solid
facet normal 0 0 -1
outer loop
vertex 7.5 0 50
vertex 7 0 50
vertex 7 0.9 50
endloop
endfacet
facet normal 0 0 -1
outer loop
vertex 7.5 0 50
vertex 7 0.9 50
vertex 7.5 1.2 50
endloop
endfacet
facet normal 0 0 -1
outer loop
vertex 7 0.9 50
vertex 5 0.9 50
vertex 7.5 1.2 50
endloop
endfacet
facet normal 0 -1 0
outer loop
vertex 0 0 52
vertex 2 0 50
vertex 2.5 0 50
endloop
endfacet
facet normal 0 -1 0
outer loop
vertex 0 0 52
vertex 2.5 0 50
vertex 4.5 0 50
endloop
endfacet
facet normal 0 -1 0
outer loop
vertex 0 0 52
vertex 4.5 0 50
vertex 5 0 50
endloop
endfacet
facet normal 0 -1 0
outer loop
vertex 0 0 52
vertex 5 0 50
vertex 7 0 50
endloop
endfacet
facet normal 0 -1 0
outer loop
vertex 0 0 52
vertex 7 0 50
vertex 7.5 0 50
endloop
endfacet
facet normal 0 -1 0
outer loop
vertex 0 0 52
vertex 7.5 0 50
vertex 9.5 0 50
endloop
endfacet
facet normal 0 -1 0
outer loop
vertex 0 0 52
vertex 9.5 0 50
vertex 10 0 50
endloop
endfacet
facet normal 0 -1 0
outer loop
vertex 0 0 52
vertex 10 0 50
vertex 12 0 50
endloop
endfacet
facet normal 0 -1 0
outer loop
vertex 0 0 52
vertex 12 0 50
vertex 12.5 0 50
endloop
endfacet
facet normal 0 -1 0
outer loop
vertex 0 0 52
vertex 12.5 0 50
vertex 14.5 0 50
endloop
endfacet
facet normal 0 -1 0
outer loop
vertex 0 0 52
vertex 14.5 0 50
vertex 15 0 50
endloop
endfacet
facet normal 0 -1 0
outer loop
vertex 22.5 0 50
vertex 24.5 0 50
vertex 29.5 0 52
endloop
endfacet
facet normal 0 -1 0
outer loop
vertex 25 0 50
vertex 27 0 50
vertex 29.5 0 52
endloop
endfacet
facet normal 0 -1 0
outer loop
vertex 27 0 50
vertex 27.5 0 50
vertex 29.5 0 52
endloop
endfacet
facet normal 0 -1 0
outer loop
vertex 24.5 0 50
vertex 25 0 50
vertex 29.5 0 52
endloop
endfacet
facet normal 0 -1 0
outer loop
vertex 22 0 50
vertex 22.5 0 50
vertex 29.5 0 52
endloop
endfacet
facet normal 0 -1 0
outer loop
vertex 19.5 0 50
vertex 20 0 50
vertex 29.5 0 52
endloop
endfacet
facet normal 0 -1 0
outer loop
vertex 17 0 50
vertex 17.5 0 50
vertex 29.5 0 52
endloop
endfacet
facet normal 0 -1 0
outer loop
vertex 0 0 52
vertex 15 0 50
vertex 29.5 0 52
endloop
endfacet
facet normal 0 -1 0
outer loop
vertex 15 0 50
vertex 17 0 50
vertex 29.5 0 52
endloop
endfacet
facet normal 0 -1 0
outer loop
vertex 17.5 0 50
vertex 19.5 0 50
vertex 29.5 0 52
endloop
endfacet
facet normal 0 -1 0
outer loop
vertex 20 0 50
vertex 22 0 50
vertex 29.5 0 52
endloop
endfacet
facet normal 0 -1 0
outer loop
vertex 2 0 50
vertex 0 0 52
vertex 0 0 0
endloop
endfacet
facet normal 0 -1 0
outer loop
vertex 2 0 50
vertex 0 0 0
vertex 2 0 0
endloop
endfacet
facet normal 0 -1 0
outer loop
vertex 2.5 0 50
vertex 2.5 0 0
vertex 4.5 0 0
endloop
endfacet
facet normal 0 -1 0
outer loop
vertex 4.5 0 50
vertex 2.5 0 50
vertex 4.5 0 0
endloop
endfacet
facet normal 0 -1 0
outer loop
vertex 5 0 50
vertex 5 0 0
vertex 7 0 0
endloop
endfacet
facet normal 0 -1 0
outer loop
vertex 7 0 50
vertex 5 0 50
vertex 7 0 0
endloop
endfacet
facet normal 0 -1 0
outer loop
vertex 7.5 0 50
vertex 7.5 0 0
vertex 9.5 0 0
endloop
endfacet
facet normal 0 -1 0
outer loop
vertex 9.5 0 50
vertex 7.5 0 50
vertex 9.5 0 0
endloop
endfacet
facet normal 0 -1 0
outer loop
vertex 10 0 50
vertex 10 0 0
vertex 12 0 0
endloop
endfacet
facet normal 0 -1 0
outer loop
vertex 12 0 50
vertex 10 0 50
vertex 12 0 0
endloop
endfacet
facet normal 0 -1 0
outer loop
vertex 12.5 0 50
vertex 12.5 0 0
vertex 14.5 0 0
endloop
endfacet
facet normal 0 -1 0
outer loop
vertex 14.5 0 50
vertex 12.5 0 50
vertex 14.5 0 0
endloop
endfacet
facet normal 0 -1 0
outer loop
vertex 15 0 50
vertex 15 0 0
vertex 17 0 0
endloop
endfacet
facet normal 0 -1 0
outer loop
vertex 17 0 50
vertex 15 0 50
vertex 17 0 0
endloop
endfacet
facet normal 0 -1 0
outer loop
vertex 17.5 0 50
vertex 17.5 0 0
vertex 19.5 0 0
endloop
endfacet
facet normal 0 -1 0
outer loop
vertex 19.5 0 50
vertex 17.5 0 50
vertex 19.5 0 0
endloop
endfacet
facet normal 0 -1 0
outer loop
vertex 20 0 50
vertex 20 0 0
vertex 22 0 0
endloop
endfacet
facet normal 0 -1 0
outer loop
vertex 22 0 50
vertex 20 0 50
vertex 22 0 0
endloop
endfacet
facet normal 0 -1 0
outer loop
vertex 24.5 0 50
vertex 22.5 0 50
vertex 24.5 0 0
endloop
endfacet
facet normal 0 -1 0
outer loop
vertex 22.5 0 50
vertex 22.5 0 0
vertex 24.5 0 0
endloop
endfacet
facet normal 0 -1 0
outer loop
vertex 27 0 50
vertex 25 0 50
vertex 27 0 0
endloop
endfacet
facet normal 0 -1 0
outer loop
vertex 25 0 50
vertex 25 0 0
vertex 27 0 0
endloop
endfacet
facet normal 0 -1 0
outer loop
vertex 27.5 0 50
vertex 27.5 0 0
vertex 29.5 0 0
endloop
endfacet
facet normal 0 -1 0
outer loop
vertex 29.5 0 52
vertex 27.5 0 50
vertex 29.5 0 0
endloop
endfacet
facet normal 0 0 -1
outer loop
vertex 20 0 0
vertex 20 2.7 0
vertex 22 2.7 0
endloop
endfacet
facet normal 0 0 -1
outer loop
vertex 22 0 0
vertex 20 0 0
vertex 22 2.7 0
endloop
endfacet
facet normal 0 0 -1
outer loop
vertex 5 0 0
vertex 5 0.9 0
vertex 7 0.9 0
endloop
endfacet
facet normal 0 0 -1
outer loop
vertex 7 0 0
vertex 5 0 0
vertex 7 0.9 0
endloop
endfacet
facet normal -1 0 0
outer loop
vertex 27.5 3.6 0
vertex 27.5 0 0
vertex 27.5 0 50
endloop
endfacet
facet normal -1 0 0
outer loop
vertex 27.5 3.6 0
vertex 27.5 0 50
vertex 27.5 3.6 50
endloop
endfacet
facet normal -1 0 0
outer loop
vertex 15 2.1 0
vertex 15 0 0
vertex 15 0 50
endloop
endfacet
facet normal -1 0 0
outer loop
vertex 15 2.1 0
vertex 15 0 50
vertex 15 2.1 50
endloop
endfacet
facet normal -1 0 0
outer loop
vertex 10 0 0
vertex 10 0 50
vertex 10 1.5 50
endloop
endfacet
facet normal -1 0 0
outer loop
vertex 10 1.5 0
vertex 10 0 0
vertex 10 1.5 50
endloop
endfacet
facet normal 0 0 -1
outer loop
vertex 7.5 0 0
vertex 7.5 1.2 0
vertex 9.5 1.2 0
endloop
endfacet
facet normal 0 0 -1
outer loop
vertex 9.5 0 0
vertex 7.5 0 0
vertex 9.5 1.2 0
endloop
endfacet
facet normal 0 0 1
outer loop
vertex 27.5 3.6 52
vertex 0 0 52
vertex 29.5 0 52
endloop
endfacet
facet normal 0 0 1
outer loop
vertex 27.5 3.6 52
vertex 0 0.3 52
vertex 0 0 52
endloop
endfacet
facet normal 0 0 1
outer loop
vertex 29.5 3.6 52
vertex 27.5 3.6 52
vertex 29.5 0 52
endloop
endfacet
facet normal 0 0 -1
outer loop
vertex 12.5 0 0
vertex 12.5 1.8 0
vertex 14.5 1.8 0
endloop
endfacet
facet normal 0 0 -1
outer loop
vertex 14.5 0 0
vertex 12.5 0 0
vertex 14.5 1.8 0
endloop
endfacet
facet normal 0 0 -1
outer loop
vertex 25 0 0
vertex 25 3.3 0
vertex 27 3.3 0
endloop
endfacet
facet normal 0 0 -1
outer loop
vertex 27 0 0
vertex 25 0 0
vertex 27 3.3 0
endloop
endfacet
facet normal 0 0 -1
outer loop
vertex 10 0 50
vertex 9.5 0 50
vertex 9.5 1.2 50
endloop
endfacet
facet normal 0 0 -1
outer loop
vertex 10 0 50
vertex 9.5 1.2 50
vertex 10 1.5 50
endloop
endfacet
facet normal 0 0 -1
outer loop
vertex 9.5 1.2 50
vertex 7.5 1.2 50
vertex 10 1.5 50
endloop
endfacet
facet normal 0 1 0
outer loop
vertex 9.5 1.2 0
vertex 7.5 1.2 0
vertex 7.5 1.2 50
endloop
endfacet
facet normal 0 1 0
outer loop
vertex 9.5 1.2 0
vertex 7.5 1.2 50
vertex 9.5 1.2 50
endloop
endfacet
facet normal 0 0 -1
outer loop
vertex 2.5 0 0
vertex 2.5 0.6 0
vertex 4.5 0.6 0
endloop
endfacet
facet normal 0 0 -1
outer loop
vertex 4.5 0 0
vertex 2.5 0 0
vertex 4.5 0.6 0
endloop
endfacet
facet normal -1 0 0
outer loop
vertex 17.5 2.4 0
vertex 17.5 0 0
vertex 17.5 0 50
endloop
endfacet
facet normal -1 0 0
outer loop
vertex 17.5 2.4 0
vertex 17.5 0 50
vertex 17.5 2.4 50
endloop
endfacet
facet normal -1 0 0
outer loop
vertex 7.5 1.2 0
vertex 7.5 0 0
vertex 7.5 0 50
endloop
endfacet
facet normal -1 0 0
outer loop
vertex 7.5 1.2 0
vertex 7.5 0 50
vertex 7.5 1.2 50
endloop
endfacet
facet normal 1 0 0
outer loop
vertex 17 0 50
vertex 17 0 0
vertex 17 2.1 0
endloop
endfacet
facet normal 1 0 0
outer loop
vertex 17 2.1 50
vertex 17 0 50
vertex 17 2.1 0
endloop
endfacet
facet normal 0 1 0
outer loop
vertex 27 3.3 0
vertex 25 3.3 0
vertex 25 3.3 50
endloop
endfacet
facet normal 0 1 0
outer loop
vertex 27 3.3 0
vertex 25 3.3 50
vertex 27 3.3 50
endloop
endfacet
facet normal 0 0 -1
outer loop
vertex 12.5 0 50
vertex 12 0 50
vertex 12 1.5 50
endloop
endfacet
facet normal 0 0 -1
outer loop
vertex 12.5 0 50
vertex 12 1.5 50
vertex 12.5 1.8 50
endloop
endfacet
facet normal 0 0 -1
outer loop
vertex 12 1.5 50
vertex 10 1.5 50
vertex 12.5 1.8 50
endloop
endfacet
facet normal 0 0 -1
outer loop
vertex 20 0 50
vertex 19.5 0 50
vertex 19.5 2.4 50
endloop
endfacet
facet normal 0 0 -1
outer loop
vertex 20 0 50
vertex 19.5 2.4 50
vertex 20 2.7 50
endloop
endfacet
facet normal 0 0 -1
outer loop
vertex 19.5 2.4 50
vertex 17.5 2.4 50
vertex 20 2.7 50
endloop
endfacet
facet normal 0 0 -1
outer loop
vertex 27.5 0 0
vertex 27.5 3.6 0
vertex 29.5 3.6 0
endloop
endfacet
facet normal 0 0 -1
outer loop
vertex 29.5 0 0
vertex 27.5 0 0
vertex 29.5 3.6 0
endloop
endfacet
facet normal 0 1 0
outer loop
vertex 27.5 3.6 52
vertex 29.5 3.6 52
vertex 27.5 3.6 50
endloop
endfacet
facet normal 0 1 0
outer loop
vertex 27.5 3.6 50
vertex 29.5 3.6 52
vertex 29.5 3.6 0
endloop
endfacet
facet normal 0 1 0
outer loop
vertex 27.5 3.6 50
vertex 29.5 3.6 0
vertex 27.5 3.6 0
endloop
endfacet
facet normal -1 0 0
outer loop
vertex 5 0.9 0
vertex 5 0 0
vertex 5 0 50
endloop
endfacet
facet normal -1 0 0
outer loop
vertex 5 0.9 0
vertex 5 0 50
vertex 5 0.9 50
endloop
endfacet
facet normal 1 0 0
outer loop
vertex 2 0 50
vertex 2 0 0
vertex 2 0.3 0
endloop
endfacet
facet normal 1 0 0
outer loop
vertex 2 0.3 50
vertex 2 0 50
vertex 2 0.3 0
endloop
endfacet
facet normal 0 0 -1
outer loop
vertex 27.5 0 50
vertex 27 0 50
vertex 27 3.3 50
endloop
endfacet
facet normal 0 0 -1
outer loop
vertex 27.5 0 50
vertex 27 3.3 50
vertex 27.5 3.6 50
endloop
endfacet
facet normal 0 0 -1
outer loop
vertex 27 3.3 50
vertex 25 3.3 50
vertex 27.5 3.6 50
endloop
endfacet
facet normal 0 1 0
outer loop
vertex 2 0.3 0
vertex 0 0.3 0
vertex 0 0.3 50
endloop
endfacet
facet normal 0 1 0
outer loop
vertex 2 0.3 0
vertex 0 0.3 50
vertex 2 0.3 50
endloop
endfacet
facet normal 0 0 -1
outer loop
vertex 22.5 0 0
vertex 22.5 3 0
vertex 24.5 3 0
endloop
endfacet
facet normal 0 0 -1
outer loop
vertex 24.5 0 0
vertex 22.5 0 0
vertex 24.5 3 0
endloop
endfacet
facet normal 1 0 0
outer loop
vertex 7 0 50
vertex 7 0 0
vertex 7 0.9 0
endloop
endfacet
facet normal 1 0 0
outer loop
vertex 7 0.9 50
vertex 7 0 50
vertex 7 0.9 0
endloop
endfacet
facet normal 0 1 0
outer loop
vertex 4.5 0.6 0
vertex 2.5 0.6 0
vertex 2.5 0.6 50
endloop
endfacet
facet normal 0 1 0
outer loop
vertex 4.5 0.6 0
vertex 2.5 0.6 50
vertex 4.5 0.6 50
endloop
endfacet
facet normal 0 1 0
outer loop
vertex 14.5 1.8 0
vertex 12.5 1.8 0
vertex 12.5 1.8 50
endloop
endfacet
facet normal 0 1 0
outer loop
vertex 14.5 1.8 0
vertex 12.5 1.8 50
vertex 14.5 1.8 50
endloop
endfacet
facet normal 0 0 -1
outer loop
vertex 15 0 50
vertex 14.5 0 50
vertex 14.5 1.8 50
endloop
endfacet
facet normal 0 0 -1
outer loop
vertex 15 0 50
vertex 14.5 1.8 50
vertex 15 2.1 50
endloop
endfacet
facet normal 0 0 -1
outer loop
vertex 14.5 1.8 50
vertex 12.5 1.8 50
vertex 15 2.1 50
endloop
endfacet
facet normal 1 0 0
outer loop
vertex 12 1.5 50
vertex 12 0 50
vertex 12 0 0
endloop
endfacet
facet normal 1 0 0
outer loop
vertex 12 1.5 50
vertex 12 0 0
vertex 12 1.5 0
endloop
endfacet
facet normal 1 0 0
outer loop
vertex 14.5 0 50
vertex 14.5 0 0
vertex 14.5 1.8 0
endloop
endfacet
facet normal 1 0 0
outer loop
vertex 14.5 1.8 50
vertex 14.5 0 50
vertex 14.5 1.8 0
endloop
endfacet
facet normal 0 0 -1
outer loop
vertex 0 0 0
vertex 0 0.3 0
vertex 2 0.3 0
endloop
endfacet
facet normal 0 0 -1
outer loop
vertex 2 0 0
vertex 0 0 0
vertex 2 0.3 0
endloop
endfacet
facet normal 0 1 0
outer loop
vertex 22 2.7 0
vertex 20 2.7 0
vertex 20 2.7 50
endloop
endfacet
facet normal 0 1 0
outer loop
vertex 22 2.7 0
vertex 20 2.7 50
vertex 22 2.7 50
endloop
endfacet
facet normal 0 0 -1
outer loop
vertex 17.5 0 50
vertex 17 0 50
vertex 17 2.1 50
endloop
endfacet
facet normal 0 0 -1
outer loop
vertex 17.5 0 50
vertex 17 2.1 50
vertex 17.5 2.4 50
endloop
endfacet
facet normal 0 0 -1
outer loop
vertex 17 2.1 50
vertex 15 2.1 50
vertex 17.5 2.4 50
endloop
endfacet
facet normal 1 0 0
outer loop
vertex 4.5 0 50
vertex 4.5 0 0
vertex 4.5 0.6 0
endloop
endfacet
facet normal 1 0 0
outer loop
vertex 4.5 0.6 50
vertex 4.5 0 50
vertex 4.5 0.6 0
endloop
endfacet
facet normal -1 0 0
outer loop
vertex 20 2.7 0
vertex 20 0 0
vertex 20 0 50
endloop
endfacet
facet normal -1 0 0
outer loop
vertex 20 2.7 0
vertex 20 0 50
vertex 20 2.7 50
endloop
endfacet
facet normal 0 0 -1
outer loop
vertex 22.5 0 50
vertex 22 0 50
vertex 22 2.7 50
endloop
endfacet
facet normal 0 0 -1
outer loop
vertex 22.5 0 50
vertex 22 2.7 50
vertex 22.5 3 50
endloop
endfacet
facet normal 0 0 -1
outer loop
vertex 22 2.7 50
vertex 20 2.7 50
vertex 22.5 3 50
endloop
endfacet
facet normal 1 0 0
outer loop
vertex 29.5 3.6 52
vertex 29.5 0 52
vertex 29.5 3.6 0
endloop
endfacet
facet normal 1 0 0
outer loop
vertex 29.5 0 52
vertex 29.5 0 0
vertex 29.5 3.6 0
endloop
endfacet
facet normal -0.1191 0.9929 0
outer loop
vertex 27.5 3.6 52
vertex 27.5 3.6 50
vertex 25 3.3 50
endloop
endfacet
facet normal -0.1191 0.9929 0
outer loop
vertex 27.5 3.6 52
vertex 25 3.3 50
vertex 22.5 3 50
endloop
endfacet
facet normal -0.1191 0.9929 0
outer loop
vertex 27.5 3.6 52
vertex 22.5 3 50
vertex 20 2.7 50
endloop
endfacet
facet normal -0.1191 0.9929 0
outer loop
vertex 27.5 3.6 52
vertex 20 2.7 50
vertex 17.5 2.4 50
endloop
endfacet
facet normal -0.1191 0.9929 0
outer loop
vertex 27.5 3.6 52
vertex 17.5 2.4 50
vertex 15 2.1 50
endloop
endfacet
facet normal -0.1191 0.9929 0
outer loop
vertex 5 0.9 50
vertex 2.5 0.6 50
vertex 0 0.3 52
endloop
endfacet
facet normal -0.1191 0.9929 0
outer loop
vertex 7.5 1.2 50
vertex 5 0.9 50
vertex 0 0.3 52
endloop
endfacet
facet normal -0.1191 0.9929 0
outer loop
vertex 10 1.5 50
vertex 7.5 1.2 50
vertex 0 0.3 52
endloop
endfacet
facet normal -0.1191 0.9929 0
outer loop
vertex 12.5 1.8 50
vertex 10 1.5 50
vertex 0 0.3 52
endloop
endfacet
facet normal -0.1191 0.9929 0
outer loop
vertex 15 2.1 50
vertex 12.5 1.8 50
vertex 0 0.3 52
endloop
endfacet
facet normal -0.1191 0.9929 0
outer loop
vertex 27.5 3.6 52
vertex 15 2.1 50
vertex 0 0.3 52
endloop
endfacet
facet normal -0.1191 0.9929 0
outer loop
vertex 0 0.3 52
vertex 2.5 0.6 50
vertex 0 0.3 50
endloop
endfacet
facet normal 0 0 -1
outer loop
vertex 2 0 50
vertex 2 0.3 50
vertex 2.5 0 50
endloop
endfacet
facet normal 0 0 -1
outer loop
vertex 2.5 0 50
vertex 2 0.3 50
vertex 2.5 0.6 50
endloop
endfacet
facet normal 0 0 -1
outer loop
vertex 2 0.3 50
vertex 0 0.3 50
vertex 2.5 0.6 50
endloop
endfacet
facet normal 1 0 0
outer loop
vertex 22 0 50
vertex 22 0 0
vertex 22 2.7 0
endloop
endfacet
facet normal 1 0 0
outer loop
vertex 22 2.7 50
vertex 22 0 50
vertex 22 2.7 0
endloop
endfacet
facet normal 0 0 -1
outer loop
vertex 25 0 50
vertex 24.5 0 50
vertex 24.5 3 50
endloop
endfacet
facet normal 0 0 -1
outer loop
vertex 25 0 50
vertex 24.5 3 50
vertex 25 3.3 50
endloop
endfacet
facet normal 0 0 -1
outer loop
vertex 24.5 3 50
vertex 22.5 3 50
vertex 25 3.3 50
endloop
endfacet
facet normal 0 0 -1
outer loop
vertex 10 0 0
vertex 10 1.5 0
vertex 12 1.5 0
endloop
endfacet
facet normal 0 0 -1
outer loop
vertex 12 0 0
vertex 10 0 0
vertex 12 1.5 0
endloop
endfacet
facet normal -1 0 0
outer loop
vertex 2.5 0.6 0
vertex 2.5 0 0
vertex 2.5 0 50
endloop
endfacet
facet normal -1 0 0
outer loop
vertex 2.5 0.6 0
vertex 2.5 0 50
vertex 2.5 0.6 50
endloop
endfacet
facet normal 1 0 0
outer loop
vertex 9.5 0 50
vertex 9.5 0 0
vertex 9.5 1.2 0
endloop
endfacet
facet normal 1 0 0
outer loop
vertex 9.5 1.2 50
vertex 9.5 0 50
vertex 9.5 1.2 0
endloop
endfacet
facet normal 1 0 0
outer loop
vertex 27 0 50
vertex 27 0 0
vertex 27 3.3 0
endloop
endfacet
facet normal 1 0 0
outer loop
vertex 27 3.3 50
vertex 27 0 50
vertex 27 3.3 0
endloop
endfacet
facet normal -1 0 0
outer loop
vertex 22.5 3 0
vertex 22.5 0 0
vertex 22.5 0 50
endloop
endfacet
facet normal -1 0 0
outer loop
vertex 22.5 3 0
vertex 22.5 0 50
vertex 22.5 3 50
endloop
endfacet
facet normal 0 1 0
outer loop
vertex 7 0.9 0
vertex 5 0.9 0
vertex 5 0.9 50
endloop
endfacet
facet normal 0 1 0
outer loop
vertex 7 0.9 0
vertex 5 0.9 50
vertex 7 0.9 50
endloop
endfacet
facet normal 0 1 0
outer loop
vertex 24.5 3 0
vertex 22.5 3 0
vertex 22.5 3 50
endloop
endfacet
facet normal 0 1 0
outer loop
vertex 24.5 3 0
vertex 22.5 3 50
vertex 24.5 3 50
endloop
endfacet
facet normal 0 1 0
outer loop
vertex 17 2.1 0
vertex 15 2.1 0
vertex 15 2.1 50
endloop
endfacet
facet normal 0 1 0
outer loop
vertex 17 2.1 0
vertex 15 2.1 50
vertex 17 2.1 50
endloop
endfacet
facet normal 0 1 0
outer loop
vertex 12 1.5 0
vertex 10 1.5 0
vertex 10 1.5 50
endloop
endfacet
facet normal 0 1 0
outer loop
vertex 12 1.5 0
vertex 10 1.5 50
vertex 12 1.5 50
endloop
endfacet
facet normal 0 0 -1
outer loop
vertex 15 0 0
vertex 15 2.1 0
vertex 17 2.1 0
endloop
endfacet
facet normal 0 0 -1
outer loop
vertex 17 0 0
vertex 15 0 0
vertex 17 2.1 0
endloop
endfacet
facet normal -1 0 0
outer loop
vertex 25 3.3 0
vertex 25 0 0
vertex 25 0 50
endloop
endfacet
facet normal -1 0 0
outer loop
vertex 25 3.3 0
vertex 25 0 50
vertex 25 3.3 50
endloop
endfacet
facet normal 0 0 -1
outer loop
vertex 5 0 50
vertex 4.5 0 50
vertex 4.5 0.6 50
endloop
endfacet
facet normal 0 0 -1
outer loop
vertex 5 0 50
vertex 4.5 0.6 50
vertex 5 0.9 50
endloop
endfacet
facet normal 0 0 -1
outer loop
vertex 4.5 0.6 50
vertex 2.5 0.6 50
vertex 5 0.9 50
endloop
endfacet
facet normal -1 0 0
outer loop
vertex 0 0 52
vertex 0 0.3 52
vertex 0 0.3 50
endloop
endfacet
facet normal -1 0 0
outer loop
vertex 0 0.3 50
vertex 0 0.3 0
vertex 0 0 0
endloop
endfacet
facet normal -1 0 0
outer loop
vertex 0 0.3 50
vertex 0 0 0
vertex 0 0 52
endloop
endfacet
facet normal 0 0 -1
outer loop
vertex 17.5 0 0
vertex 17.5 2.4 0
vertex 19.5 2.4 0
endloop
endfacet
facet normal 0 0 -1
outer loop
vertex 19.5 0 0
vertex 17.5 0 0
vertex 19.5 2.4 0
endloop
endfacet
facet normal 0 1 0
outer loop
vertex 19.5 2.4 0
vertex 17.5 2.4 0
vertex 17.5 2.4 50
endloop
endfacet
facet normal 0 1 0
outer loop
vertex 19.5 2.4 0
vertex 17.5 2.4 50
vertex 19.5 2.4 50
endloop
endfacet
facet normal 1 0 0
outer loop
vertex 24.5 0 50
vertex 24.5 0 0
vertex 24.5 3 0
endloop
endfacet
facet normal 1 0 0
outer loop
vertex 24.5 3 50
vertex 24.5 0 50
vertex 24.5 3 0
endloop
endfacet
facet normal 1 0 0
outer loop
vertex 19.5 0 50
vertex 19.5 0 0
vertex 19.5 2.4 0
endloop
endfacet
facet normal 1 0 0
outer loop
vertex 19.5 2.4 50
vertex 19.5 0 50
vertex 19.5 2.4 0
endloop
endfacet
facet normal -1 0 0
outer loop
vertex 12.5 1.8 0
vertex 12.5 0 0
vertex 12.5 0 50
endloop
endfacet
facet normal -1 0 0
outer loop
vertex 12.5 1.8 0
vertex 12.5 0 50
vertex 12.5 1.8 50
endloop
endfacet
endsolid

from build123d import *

# Parameters (mm, degrees)
SKETCH1_W              = 2
SKETCH1_H              = 0.3
BOSS_EXTRUDE1_DEPTH    = 50
SKETCH1_H_2            = 0.6
BOSS_EXTRUDE1_2_DEPTH  = 50
SKETCH1_H_3            = 0.9
BOSS_EXTRUDE1_3_DEPTH  = 50
SKETCH1_H_4            = 1.2
BOSS_EXTRUDE1_4_DEPTH  = 50
SKETCH1_H_5            = 1.5
BOSS_EXTRUDE1_5_DEPTH  = 50
SKETCH1_H_6            = 1.8
BOSS_EXTRUDE1_6_DEPTH  = 50
SKETCH1_H_7            = 2.1
BOSS_EXTRUDE1_7_DEPTH  = 50
SKETCH1_H_8            = 2.4
BOSS_EXTRUDE1_8_DEPTH  = 50
SKETCH1_H_9            = 2.7
BOSS_EXTRUDE1_9_DEPTH  = 50
SKETCH1_H_10           = 3
BOSS_EXTRUDE1_10_DEPTH = 50
SKETCH1_H_11           = 3.3
BOSS_EXTRUDE1_11_DEPTH = 50
SKETCH1_H_12           = 3.6
BOSS_EXTRUDE1_12_DEPTH = 50
BOSS_EXTRUDE2_DEPTH    = 2


with BuildPart() as part:
    # Sketch1 → Boss-Extrude1 (new body)
    with BuildSketch(Plane.XY):
        with Locations((1, 0.15)):
            Rectangle(SKETCH1_W, SKETCH1_H)
    extrude(amount=BOSS_EXTRUDE1_DEPTH)



with BuildPart() as body_2:
    # Sketch1 → Boss-Extrude1 2 (new body)
    with BuildSketch(Plane.XY):
        with Locations((3.5, 0.3)):
            Rectangle(SKETCH1_W, SKETCH1_H_2)
    extrude(amount=BOSS_EXTRUDE1_2_DEPTH)


with BuildPart() as body_3:
    # Sketch1 → Boss-Extrude1 3 (new body)
    with BuildSketch(Plane.XY):
        with Locations((6, 0.45)):
            Rectangle(SKETCH1_W, SKETCH1_H_3)
    extrude(amount=BOSS_EXTRUDE1_3_DEPTH)


with BuildPart() as body_4:
    # Sketch1 → Boss-Extrude1 4 (new body)
    with BuildSketch(Plane.XY):
        with Locations((8.5, 0.6)):
            Rectangle(SKETCH1_W, SKETCH1_H_4)
    extrude(amount=BOSS_EXTRUDE1_4_DEPTH)


with BuildPart() as body_5:
    # Sketch1 → Boss-Extrude1 5 (new body)
    with BuildSketch(Plane.XY):
        with Locations((11, 0.75)):
            Rectangle(SKETCH1_W, SKETCH1_H_5)
    extrude(amount=BOSS_EXTRUDE1_5_DEPTH)


with BuildPart() as body_6:
    # Sketch1 → Boss-Extrude1 6 (new body)
    with BuildSketch(Plane.XY):
        with Locations((13.5, 0.9)):
            Rectangle(SKETCH1_W, SKETCH1_H_6)
    extrude(amount=BOSS_EXTRUDE1_6_DEPTH)


with BuildPart() as body_7:
    # Sketch1 → Boss-Extrude1 7 (new body)
    with BuildSketch(Plane.XY):
        with Locations((16, 1.05)):
            Rectangle(SKETCH1_W, SKETCH1_H_7)
    extrude(amount=BOSS_EXTRUDE1_7_DEPTH)


with BuildPart() as body_8:
    # Sketch1 → Boss-Extrude1 8 (new body)
    with BuildSketch(Plane.XY):
        with Locations((18.5, 1.2)):
            Rectangle(SKETCH1_W, SKETCH1_H_8)
    extrude(amount=BOSS_EXTRUDE1_8_DEPTH)


with BuildPart() as body_9:
    # Sketch1 → Boss-Extrude1 9 (new body)
    with BuildSketch(Plane.XY):
        with Locations((21, 1.35)):
            Rectangle(SKETCH1_W, SKETCH1_H_9)
    extrude(amount=BOSS_EXTRUDE1_9_DEPTH)


with BuildPart() as body_10:
    # Sketch1 → Boss-Extrude1 10 (new body)
    with BuildSketch(Plane.XY):
        with Locations((23.5, 1.5)):
            Rectangle(SKETCH1_W, SKETCH1_H_10)
    extrude(amount=BOSS_EXTRUDE1_10_DEPTH)


with BuildPart() as body_11:
    # Sketch1 → Boss-Extrude1 11 (new body)
    with BuildSketch(Plane.XY):
        with Locations((26, 1.65)):
            Rectangle(SKETCH1_W, SKETCH1_H_11)
    extrude(amount=BOSS_EXTRUDE1_11_DEPTH)


with BuildPart() as body_12:
    # Sketch1 → Boss-Extrude1 12 (new body)
    with BuildSketch(Plane.XY):
        with Locations((28.5, 1.8)):
            Rectangle(SKETCH1_W, SKETCH1_H_12)
    extrude(amount=BOSS_EXTRUDE1_12_DEPTH)


with BuildPart() as part_1:
    add(part.part)

    add(body_2.part)  # Boss-Extrude2 merges body 2

    add(body_3.part)  # Boss-Extrude2 merges body 3

    add(body_4.part)  # Boss-Extrude2 merges body 4

    add(body_5.part)  # Boss-Extrude2 merges body 5

    add(body_6.part)  # Boss-Extrude2 merges body 6

    add(body_7.part)  # Boss-Extrude2 merges body 7

    add(body_8.part)  # Boss-Extrude2 merges body 8

    add(body_9.part)  # Boss-Extrude2 merges body 9

    add(body_10.part)  # Boss-Extrude2 merges body 10

    add(body_11.part)  # Boss-Extrude2 merges body 11

    add(body_12.part)  # Boss-Extrude2 merges body 12
    # Sketch2 → Boss-Extrude2 (add)
    with BuildSketch(Plane.XY.offset(50)):
        Polygon((0, 0), (29.5, 0), (29.5, 3.6), (27.5, 3.6), (0, 0.3), align=None)
    extrude(amount=BOSS_EXTRUDE2_DEPTH)


solid = part_1.part
